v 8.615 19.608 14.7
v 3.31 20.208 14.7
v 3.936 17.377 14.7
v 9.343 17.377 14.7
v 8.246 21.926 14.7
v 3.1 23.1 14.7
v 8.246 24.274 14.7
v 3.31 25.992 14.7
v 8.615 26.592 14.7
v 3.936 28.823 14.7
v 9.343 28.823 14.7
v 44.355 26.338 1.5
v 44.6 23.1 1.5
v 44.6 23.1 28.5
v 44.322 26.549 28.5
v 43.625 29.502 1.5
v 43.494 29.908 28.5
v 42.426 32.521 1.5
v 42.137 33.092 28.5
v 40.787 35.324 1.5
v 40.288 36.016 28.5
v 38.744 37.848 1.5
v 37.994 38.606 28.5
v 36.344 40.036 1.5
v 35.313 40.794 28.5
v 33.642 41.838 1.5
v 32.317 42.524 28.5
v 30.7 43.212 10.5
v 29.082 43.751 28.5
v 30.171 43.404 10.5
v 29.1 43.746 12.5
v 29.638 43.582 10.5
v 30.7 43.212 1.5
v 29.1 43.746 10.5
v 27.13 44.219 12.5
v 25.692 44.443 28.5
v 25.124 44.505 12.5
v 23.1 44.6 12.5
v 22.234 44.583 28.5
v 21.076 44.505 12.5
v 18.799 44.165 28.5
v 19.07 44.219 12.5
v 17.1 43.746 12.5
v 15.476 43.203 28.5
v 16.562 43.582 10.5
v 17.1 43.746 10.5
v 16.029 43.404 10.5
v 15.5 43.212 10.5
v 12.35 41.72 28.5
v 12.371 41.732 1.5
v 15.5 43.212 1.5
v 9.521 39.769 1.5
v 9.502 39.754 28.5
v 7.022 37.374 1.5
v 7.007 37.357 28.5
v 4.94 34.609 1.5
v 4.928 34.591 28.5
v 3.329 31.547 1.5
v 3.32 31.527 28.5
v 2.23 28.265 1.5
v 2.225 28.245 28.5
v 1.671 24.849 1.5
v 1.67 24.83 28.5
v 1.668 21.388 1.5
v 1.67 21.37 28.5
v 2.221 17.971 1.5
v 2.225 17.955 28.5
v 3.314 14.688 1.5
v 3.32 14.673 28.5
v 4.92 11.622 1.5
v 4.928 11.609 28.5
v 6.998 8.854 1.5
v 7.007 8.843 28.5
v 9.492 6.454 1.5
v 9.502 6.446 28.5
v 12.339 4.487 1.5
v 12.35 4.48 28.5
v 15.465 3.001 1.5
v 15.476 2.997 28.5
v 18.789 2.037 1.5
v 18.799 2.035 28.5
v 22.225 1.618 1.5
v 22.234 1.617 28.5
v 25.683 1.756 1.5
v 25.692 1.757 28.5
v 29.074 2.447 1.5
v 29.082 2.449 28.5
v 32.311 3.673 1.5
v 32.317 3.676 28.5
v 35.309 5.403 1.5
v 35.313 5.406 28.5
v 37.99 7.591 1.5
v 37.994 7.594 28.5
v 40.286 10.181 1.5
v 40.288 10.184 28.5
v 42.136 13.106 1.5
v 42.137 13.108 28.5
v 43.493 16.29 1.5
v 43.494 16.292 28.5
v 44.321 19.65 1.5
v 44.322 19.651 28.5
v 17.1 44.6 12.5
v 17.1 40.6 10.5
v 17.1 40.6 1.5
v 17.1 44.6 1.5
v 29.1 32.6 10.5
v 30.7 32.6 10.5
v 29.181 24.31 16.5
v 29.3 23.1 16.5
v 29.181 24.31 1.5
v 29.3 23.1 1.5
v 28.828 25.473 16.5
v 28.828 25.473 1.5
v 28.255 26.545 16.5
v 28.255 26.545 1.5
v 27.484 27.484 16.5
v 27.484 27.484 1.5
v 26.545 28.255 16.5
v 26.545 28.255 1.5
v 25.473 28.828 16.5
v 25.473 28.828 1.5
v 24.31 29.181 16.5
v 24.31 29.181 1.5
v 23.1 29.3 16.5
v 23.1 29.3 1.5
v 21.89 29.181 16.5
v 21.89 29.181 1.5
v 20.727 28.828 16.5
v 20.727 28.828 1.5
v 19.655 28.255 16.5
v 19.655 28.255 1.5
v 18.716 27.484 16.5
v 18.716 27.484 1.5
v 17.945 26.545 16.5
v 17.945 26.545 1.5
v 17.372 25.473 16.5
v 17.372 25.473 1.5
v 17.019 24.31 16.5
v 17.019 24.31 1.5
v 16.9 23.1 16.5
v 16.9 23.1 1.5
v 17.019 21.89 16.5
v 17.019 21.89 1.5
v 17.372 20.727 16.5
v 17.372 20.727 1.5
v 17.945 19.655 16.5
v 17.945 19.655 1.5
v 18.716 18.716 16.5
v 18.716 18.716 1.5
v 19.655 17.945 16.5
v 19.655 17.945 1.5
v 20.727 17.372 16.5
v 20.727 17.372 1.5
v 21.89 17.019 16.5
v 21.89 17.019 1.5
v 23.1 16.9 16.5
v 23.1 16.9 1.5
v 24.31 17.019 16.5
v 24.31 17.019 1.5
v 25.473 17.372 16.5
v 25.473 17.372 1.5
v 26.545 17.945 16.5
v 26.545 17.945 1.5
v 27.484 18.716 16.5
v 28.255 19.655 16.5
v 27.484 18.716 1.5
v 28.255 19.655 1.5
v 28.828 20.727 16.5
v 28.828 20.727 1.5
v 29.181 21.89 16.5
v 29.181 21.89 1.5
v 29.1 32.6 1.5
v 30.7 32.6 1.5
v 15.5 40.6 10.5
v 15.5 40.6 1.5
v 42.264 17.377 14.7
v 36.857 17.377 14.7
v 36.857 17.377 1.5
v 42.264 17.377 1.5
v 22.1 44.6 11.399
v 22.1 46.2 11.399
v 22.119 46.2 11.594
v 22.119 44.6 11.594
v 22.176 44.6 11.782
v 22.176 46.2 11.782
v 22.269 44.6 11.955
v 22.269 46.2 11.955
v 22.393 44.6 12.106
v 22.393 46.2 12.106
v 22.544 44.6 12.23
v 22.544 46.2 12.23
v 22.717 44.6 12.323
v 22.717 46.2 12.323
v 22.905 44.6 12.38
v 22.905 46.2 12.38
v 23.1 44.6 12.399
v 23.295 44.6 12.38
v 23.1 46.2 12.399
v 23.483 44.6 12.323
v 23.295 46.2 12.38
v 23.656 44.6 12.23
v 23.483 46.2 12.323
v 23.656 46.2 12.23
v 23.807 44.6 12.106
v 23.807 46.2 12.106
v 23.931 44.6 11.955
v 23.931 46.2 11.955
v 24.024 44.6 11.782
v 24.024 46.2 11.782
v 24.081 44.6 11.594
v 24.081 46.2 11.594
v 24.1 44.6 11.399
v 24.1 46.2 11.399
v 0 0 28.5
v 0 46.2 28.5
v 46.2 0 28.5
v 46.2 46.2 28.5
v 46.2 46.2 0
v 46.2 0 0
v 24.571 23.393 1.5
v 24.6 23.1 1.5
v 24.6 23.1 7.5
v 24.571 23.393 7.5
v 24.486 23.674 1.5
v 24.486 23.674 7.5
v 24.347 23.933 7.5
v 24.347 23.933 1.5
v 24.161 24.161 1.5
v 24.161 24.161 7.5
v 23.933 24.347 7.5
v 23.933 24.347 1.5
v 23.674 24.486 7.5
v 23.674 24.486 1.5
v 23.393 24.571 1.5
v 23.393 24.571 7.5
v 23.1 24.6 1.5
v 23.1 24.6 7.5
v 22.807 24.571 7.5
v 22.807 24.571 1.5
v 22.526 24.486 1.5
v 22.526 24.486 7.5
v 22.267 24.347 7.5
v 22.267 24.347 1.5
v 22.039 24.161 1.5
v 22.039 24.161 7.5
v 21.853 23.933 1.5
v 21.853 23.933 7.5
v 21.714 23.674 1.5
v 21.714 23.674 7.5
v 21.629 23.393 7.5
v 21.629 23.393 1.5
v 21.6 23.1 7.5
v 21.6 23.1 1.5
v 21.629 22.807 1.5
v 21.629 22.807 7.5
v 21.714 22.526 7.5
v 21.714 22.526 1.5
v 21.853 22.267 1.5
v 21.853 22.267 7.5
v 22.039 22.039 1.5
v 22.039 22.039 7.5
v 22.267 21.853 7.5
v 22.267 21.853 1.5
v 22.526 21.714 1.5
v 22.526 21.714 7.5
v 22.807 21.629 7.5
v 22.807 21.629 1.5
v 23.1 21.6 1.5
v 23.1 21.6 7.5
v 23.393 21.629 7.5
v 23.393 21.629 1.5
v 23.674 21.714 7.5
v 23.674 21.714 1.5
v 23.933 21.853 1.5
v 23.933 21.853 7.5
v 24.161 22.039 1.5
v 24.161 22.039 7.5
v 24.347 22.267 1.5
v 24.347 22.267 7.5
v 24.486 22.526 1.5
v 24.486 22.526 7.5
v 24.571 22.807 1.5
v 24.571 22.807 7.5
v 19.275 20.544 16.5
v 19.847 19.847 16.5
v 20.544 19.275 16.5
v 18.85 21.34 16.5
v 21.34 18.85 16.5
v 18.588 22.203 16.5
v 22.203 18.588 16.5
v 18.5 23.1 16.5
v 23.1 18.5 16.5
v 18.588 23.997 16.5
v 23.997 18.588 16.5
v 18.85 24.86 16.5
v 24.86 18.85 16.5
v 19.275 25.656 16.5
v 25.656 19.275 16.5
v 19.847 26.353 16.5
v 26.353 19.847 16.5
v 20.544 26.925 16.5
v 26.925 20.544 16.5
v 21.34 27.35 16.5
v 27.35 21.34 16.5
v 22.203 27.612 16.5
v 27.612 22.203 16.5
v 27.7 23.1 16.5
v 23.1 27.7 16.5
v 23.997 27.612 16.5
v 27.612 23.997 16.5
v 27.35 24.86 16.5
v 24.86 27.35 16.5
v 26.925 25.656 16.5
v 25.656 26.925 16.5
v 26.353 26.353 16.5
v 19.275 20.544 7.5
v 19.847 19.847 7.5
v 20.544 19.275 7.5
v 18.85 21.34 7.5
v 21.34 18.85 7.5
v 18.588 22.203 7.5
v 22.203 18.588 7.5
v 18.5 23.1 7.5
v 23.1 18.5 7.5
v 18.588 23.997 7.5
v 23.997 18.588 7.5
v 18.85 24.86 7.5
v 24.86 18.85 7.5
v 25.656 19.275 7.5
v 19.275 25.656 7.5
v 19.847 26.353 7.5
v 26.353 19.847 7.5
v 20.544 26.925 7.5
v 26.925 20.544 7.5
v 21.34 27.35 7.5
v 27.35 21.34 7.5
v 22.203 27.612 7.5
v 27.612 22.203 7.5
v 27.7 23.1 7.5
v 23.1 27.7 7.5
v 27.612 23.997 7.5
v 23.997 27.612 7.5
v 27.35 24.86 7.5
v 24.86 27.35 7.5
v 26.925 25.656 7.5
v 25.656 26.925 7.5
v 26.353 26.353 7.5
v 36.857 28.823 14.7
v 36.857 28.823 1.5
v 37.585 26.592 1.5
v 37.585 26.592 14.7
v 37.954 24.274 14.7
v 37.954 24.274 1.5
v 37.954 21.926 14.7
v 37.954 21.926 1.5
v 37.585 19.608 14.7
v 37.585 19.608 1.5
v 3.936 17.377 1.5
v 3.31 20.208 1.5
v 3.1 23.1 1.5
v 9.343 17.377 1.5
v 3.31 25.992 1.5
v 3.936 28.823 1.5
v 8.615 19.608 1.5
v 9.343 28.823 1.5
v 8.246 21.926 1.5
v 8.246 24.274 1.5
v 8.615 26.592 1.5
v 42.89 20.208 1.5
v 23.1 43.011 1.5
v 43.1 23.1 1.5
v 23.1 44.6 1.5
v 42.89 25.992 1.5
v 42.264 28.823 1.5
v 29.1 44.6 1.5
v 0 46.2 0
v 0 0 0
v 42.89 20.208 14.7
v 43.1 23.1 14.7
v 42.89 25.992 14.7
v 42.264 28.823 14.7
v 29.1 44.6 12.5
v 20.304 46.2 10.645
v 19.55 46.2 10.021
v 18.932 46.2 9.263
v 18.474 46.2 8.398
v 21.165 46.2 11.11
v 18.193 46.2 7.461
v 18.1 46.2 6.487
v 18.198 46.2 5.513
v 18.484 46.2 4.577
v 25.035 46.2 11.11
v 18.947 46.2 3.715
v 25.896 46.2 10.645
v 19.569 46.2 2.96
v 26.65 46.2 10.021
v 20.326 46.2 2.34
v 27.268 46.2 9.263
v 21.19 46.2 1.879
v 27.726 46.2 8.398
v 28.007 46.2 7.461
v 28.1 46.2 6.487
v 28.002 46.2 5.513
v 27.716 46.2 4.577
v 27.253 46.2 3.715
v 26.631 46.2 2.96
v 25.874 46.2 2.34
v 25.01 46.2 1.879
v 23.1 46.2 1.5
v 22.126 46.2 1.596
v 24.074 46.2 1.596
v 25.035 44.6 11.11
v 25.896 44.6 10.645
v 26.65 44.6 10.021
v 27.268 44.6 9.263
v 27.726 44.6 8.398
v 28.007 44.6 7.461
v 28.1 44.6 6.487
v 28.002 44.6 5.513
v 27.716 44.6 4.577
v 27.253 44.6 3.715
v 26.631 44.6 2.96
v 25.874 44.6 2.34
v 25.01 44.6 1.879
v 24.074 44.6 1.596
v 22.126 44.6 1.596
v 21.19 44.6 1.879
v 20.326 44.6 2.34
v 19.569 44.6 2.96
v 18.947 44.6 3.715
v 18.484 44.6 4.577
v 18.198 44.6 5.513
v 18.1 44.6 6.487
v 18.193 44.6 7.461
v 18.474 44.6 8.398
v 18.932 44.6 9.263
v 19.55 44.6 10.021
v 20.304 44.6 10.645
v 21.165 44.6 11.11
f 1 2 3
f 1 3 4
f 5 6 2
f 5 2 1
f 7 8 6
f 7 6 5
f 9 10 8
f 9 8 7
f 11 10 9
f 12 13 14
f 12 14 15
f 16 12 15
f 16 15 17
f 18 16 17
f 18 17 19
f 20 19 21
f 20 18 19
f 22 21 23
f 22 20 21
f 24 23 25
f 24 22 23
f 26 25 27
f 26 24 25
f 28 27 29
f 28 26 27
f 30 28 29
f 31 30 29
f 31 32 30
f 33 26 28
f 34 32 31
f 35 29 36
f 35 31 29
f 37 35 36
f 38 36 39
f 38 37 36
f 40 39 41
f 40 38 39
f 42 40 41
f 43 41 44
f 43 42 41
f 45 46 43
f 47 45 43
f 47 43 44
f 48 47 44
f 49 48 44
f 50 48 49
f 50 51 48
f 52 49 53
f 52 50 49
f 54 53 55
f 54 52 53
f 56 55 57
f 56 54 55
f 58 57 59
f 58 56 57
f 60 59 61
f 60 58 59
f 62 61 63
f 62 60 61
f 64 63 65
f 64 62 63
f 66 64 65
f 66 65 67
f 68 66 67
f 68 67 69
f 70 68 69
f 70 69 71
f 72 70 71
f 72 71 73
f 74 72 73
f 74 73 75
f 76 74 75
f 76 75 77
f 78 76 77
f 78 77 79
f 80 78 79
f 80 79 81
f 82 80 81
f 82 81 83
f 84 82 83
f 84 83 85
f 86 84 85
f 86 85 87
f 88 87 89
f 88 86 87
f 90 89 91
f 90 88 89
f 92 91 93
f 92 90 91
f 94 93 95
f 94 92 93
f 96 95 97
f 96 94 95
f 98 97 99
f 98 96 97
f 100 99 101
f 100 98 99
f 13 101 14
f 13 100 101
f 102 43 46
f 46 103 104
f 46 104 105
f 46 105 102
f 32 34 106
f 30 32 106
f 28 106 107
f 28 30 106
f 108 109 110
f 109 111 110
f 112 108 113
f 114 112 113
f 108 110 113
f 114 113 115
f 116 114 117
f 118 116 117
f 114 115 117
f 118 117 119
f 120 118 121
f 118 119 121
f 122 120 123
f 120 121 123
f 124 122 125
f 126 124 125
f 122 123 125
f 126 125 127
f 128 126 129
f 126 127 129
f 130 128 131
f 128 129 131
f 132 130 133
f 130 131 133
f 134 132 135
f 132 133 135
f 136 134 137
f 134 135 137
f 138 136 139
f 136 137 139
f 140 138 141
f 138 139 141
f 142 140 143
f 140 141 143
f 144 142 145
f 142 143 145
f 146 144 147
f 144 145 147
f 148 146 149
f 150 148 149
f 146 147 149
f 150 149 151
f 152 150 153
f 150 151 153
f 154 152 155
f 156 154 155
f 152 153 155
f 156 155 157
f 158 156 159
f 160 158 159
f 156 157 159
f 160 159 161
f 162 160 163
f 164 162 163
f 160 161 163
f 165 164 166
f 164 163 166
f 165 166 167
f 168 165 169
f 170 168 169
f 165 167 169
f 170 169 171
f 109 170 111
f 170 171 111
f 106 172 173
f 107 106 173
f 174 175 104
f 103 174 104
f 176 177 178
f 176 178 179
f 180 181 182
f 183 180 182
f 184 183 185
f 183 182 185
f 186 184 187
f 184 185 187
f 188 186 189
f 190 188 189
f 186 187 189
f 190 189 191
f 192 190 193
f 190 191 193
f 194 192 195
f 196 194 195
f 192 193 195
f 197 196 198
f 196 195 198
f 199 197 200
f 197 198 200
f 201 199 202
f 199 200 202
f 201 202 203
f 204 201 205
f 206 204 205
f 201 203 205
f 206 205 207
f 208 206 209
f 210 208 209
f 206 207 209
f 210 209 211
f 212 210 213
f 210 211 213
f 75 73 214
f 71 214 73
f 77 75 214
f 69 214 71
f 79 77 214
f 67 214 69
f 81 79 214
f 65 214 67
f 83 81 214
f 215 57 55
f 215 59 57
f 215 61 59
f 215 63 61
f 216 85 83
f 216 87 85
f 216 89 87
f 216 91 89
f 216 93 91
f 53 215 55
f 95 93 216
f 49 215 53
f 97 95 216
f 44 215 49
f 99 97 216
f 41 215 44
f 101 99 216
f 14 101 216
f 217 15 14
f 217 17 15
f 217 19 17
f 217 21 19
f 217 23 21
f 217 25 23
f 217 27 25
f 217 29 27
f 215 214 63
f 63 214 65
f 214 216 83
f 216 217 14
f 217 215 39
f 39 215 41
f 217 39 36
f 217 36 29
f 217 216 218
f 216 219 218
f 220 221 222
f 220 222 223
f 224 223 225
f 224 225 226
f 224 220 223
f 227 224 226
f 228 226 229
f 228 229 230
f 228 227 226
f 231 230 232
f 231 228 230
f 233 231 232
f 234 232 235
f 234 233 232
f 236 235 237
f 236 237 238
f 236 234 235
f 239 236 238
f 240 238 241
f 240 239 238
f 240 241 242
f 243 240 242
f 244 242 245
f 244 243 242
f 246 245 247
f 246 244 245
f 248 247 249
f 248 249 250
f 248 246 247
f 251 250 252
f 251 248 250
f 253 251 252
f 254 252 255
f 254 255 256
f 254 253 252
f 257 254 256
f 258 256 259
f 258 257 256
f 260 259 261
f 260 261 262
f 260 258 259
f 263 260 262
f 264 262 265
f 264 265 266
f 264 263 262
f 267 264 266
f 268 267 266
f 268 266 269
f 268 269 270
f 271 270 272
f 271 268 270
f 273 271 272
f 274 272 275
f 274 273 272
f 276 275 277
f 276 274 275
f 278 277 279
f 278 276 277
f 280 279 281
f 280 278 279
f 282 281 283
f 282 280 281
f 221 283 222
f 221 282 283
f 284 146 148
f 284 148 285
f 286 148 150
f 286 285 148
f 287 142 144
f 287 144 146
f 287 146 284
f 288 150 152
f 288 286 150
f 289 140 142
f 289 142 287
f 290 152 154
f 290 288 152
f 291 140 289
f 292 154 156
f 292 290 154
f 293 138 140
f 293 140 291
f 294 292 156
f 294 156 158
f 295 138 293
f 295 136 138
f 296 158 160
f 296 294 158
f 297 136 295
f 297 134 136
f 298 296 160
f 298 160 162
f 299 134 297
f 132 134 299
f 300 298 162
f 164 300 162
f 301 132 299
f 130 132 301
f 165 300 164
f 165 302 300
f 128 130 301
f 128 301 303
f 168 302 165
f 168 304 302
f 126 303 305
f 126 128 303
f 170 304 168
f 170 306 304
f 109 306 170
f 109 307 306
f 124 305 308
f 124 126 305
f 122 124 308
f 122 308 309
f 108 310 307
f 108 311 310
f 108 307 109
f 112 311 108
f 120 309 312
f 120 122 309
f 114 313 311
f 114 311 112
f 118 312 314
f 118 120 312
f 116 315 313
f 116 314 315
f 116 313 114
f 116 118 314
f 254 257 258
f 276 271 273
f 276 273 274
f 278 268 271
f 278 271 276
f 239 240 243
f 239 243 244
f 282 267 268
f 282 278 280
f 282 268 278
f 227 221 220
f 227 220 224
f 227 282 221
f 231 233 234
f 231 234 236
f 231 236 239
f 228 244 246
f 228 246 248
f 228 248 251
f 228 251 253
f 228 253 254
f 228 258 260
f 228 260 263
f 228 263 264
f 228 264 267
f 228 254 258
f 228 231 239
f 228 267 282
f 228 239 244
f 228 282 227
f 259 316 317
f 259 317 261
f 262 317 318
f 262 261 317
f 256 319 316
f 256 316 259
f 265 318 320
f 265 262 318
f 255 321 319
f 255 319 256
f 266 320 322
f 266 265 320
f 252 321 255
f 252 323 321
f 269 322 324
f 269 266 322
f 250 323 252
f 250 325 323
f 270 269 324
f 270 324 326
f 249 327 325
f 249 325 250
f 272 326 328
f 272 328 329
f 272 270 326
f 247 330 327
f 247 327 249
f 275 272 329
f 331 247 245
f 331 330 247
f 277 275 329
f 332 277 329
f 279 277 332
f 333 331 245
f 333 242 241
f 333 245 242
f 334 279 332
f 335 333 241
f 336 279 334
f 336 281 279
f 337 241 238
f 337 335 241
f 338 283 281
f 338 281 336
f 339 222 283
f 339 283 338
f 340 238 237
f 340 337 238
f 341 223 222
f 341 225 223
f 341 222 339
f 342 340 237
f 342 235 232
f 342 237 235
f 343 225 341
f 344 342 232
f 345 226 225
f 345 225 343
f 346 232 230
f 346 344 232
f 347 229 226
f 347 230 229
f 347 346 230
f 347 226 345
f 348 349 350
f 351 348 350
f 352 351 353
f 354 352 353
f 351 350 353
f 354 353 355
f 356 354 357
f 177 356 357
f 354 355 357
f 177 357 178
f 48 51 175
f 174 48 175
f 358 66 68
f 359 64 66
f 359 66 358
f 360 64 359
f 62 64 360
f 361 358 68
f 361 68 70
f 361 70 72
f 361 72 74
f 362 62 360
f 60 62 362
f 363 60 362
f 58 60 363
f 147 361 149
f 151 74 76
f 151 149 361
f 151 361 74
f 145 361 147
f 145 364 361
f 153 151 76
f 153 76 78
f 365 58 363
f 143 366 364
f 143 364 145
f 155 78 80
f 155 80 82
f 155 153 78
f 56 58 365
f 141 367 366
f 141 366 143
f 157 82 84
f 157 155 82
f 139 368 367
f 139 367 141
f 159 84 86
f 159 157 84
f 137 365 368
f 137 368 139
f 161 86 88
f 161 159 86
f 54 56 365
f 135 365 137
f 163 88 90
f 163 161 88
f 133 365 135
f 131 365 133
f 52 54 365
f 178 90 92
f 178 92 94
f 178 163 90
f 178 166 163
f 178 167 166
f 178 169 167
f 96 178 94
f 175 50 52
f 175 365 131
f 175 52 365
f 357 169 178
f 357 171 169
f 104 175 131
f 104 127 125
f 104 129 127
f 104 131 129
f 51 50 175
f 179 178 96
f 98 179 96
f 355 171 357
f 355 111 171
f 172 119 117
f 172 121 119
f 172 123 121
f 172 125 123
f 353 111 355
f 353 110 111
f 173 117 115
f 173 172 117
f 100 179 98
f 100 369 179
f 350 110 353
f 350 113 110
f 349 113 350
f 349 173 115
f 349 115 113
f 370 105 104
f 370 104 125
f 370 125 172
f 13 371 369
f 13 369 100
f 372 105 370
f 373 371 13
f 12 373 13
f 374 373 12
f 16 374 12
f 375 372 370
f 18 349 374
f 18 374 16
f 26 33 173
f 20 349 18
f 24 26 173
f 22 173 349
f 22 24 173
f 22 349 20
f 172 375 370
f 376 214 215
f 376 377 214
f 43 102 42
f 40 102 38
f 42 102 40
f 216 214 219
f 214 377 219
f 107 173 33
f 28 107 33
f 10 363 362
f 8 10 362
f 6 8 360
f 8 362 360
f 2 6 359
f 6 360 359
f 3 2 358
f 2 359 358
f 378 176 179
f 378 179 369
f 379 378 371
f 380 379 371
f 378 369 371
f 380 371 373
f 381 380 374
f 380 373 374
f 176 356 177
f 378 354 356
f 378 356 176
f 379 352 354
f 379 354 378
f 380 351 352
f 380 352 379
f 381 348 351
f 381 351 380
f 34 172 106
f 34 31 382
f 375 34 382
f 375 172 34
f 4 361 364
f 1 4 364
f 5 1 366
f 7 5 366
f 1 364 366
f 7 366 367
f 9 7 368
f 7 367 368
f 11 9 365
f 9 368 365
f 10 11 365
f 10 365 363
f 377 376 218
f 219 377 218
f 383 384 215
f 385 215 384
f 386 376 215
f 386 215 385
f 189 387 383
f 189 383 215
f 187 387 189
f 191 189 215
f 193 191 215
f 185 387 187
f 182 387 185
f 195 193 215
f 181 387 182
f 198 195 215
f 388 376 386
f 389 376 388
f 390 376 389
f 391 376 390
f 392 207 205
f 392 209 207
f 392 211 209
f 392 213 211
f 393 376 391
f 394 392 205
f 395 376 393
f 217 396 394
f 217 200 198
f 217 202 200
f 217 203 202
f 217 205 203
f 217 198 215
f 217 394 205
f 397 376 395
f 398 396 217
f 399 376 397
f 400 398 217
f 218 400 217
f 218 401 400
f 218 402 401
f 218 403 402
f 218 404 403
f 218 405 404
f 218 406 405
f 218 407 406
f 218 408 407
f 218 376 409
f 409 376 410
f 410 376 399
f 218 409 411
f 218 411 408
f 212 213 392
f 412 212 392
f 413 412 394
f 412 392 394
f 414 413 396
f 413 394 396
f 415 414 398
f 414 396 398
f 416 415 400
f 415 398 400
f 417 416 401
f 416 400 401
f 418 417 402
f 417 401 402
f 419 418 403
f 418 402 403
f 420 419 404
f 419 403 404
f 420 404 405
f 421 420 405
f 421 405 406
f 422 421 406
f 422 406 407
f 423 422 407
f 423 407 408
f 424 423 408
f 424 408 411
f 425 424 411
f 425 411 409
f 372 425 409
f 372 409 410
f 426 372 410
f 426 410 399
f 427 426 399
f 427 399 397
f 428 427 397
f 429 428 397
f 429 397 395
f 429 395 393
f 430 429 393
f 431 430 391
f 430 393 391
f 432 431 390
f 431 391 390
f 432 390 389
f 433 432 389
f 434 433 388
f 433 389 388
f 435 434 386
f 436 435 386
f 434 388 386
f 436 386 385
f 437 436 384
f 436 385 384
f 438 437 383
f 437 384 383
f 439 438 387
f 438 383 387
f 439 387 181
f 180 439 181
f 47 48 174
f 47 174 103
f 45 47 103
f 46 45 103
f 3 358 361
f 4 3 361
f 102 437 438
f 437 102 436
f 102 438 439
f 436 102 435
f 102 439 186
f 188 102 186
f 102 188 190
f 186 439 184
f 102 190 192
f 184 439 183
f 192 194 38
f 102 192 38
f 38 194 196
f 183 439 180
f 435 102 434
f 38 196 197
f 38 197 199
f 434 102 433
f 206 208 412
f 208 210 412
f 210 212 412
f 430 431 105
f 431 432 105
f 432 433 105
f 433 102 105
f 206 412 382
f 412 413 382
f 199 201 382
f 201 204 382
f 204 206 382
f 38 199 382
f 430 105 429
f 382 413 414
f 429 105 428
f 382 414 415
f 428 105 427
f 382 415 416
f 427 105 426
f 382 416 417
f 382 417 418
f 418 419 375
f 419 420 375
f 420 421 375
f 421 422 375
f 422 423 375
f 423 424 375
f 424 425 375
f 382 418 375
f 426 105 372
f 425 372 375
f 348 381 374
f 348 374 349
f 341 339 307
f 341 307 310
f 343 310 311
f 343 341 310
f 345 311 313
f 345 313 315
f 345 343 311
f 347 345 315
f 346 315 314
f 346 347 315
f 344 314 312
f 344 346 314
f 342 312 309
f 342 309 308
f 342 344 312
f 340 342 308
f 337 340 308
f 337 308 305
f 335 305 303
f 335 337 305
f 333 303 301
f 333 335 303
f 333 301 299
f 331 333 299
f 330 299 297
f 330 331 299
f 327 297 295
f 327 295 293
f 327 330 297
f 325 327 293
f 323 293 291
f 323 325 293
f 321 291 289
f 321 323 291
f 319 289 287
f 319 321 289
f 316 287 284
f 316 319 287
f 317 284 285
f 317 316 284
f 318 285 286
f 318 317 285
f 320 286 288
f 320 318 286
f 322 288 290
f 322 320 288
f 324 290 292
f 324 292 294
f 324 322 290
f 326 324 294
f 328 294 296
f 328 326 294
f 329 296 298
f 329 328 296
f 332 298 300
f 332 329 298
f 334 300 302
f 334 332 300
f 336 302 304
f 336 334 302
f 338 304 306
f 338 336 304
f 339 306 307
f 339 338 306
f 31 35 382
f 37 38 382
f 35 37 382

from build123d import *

# Parameters (mm, degrees)
F0_W      = 46.2
F0_H      = 46.2
F1_DEPTH  = 1.5
F2_W      = 46.2
F2_H      = 46.2
F2_R      = 21.5
F3_DEPTH  = 27
F4_R      = 6.2
F4_R_2    = 1.5
F5_DEPTH  = 6
F6_R      = 6.2
F6_R_2    = 4.6
F7_DEPTH  = 9
F9_DEPTH  = 13.2
F11_DEPTH = 3.1894764338
F12_W     = 12
F12_H     = 15
F13_DEPTH = 11
F15_DEPTH = 9


with BuildPart() as f1:
    # F0 (on Top) → F1 (new body)
    with BuildSketch(Plane.XY):
        with Locations((23.1, 23.1)):
            Rectangle(F0_W, F0_H)
    extrude(amount=F1_DEPTH)

    # F2 (on face) → F3 (join)
    with BuildSketch(Plane.XY.offset(1.5)):
        with Locations((23.1, 23.1)):
            Rectangle(F2_W, F2_H)
        with Locations((23.1, 23.1)):
            Circle(F2_R, mode=Mode.SUBTRACT)
    extrude(amount=F3_DEPTH)

    # F4 (on face) → F5 (join)
    with BuildSketch(Plane.XY.offset(1.5)):
        with Locations((23.1, 23.1)):
            Circle(F4_R)
        with Locations((23.1, 23.1)):
            Circle(F4_R_2, mode=Mode.SUBTRACT)
    extrude(amount=F5_DEPTH)

    # F6 (on face) → F7 (join)
    with BuildSketch(Plane.XY.offset(7.5)):
        with Locations((23.1, 23.1)):
            Circle(F6_R)
        with Locations((23.1, 23.1)):
            Circle(F6_R_2, mode=Mode.SUBTRACT)
    extrude(amount=F7_DEPTH)

    # F8 (on face) → F9 (join)
    with BuildSketch(Plane.XY.offset(1.5)):
        with BuildLine():
            ThreePointArc((3.9363687534, 28.8232191506), (3.1, 23.1), (3.9363687534, 17.3767808494))
            Line((3.9363687534, 17.3767808494), (9.3430104109, 17.3767808494))
            ThreePointArc((9.3430104109, 17.3767808494), (8.2, 23.1), (9.3430104109, 28.8232191506))
            Line((9.3430104109, 28.8232191506), (3.9363687534, 28.8232191506))
        make_face()
        with BuildLine():
            ThreePointArc((42.2636312466, 17.3767808494), (43.1, 23.1), (42.2636312466, 28.8232191506))
            Line((42.2636312466, 28.8232191506), (36.8569895891, 28.8232191506))
            ThreePointArc((36.8569895891, 28.8232191506), (38, 23.1), (36.8569895891, 17.3767808494))
            Line((36.8569895891, 17.3767808494), (42.2636312466, 17.3767808494))
        make_face()
    extrude(amount=F9_DEPTH)

    # F10 (on face) → F11 (cut, up to face)
    with BuildSketch(Plane(origin=(0, 46.2, 0), x_dir=(-1, 0, 0), z_dir=(0, 1, 0))):
        with BuildLine():
            ThreePointArc((-24.1, 11.3989794856), (-23.1, 1.5), (-22.1, 11.3989794856))
            ThreePointArc((-22.1, 11.3989794856), (-23.1, 12.3989794856), (-24.1, 11.3989794856))
        make_face()
    extrude(amount=-F11_DEPTH, mode=Mode.SUBTRACT)

    # F12 (on face) → F13 (cut)
    with BuildSketch(Plane.XY.offset(1.5)):
        with Locations((23.1, 37.1)):
            Rectangle(F12_W, F12_H)
    extrude(amount=F13_DEPTH, mode=Mode.SUBTRACT)

    # F14 (on face) → F15 (join)
    with BuildSketch(Plane.XY.offset(1.5)):
        with BuildLine():
            Line((17.1, 40.6), (17.1, 43.7458228221))
            ThreePointArc((17.1, 43.7458228221), (16.2947624154, 43.4945762745), (15.5, 43.2119367541))
            Line((15.5, 43.2119367541), (15.5, 40.6))
            Line((15.5, 40.6), (17.1, 40.6))
        make_face()
        with BuildLine():
            ThreePointArc((30.7, 43.2119367541), (29.9052375846, 43.4945762745), (29.1, 43.7458228221))
            Line((29.1, 43.7458228221), (29.1, 32.6))
            Line((29.1, 32.6), (30.7, 32.6))
            Line((30.7, 32.6), (30.7, 43.2119367541))
        make_face()
    extrude(amount=F15_DEPTH)


solid = f1.part
